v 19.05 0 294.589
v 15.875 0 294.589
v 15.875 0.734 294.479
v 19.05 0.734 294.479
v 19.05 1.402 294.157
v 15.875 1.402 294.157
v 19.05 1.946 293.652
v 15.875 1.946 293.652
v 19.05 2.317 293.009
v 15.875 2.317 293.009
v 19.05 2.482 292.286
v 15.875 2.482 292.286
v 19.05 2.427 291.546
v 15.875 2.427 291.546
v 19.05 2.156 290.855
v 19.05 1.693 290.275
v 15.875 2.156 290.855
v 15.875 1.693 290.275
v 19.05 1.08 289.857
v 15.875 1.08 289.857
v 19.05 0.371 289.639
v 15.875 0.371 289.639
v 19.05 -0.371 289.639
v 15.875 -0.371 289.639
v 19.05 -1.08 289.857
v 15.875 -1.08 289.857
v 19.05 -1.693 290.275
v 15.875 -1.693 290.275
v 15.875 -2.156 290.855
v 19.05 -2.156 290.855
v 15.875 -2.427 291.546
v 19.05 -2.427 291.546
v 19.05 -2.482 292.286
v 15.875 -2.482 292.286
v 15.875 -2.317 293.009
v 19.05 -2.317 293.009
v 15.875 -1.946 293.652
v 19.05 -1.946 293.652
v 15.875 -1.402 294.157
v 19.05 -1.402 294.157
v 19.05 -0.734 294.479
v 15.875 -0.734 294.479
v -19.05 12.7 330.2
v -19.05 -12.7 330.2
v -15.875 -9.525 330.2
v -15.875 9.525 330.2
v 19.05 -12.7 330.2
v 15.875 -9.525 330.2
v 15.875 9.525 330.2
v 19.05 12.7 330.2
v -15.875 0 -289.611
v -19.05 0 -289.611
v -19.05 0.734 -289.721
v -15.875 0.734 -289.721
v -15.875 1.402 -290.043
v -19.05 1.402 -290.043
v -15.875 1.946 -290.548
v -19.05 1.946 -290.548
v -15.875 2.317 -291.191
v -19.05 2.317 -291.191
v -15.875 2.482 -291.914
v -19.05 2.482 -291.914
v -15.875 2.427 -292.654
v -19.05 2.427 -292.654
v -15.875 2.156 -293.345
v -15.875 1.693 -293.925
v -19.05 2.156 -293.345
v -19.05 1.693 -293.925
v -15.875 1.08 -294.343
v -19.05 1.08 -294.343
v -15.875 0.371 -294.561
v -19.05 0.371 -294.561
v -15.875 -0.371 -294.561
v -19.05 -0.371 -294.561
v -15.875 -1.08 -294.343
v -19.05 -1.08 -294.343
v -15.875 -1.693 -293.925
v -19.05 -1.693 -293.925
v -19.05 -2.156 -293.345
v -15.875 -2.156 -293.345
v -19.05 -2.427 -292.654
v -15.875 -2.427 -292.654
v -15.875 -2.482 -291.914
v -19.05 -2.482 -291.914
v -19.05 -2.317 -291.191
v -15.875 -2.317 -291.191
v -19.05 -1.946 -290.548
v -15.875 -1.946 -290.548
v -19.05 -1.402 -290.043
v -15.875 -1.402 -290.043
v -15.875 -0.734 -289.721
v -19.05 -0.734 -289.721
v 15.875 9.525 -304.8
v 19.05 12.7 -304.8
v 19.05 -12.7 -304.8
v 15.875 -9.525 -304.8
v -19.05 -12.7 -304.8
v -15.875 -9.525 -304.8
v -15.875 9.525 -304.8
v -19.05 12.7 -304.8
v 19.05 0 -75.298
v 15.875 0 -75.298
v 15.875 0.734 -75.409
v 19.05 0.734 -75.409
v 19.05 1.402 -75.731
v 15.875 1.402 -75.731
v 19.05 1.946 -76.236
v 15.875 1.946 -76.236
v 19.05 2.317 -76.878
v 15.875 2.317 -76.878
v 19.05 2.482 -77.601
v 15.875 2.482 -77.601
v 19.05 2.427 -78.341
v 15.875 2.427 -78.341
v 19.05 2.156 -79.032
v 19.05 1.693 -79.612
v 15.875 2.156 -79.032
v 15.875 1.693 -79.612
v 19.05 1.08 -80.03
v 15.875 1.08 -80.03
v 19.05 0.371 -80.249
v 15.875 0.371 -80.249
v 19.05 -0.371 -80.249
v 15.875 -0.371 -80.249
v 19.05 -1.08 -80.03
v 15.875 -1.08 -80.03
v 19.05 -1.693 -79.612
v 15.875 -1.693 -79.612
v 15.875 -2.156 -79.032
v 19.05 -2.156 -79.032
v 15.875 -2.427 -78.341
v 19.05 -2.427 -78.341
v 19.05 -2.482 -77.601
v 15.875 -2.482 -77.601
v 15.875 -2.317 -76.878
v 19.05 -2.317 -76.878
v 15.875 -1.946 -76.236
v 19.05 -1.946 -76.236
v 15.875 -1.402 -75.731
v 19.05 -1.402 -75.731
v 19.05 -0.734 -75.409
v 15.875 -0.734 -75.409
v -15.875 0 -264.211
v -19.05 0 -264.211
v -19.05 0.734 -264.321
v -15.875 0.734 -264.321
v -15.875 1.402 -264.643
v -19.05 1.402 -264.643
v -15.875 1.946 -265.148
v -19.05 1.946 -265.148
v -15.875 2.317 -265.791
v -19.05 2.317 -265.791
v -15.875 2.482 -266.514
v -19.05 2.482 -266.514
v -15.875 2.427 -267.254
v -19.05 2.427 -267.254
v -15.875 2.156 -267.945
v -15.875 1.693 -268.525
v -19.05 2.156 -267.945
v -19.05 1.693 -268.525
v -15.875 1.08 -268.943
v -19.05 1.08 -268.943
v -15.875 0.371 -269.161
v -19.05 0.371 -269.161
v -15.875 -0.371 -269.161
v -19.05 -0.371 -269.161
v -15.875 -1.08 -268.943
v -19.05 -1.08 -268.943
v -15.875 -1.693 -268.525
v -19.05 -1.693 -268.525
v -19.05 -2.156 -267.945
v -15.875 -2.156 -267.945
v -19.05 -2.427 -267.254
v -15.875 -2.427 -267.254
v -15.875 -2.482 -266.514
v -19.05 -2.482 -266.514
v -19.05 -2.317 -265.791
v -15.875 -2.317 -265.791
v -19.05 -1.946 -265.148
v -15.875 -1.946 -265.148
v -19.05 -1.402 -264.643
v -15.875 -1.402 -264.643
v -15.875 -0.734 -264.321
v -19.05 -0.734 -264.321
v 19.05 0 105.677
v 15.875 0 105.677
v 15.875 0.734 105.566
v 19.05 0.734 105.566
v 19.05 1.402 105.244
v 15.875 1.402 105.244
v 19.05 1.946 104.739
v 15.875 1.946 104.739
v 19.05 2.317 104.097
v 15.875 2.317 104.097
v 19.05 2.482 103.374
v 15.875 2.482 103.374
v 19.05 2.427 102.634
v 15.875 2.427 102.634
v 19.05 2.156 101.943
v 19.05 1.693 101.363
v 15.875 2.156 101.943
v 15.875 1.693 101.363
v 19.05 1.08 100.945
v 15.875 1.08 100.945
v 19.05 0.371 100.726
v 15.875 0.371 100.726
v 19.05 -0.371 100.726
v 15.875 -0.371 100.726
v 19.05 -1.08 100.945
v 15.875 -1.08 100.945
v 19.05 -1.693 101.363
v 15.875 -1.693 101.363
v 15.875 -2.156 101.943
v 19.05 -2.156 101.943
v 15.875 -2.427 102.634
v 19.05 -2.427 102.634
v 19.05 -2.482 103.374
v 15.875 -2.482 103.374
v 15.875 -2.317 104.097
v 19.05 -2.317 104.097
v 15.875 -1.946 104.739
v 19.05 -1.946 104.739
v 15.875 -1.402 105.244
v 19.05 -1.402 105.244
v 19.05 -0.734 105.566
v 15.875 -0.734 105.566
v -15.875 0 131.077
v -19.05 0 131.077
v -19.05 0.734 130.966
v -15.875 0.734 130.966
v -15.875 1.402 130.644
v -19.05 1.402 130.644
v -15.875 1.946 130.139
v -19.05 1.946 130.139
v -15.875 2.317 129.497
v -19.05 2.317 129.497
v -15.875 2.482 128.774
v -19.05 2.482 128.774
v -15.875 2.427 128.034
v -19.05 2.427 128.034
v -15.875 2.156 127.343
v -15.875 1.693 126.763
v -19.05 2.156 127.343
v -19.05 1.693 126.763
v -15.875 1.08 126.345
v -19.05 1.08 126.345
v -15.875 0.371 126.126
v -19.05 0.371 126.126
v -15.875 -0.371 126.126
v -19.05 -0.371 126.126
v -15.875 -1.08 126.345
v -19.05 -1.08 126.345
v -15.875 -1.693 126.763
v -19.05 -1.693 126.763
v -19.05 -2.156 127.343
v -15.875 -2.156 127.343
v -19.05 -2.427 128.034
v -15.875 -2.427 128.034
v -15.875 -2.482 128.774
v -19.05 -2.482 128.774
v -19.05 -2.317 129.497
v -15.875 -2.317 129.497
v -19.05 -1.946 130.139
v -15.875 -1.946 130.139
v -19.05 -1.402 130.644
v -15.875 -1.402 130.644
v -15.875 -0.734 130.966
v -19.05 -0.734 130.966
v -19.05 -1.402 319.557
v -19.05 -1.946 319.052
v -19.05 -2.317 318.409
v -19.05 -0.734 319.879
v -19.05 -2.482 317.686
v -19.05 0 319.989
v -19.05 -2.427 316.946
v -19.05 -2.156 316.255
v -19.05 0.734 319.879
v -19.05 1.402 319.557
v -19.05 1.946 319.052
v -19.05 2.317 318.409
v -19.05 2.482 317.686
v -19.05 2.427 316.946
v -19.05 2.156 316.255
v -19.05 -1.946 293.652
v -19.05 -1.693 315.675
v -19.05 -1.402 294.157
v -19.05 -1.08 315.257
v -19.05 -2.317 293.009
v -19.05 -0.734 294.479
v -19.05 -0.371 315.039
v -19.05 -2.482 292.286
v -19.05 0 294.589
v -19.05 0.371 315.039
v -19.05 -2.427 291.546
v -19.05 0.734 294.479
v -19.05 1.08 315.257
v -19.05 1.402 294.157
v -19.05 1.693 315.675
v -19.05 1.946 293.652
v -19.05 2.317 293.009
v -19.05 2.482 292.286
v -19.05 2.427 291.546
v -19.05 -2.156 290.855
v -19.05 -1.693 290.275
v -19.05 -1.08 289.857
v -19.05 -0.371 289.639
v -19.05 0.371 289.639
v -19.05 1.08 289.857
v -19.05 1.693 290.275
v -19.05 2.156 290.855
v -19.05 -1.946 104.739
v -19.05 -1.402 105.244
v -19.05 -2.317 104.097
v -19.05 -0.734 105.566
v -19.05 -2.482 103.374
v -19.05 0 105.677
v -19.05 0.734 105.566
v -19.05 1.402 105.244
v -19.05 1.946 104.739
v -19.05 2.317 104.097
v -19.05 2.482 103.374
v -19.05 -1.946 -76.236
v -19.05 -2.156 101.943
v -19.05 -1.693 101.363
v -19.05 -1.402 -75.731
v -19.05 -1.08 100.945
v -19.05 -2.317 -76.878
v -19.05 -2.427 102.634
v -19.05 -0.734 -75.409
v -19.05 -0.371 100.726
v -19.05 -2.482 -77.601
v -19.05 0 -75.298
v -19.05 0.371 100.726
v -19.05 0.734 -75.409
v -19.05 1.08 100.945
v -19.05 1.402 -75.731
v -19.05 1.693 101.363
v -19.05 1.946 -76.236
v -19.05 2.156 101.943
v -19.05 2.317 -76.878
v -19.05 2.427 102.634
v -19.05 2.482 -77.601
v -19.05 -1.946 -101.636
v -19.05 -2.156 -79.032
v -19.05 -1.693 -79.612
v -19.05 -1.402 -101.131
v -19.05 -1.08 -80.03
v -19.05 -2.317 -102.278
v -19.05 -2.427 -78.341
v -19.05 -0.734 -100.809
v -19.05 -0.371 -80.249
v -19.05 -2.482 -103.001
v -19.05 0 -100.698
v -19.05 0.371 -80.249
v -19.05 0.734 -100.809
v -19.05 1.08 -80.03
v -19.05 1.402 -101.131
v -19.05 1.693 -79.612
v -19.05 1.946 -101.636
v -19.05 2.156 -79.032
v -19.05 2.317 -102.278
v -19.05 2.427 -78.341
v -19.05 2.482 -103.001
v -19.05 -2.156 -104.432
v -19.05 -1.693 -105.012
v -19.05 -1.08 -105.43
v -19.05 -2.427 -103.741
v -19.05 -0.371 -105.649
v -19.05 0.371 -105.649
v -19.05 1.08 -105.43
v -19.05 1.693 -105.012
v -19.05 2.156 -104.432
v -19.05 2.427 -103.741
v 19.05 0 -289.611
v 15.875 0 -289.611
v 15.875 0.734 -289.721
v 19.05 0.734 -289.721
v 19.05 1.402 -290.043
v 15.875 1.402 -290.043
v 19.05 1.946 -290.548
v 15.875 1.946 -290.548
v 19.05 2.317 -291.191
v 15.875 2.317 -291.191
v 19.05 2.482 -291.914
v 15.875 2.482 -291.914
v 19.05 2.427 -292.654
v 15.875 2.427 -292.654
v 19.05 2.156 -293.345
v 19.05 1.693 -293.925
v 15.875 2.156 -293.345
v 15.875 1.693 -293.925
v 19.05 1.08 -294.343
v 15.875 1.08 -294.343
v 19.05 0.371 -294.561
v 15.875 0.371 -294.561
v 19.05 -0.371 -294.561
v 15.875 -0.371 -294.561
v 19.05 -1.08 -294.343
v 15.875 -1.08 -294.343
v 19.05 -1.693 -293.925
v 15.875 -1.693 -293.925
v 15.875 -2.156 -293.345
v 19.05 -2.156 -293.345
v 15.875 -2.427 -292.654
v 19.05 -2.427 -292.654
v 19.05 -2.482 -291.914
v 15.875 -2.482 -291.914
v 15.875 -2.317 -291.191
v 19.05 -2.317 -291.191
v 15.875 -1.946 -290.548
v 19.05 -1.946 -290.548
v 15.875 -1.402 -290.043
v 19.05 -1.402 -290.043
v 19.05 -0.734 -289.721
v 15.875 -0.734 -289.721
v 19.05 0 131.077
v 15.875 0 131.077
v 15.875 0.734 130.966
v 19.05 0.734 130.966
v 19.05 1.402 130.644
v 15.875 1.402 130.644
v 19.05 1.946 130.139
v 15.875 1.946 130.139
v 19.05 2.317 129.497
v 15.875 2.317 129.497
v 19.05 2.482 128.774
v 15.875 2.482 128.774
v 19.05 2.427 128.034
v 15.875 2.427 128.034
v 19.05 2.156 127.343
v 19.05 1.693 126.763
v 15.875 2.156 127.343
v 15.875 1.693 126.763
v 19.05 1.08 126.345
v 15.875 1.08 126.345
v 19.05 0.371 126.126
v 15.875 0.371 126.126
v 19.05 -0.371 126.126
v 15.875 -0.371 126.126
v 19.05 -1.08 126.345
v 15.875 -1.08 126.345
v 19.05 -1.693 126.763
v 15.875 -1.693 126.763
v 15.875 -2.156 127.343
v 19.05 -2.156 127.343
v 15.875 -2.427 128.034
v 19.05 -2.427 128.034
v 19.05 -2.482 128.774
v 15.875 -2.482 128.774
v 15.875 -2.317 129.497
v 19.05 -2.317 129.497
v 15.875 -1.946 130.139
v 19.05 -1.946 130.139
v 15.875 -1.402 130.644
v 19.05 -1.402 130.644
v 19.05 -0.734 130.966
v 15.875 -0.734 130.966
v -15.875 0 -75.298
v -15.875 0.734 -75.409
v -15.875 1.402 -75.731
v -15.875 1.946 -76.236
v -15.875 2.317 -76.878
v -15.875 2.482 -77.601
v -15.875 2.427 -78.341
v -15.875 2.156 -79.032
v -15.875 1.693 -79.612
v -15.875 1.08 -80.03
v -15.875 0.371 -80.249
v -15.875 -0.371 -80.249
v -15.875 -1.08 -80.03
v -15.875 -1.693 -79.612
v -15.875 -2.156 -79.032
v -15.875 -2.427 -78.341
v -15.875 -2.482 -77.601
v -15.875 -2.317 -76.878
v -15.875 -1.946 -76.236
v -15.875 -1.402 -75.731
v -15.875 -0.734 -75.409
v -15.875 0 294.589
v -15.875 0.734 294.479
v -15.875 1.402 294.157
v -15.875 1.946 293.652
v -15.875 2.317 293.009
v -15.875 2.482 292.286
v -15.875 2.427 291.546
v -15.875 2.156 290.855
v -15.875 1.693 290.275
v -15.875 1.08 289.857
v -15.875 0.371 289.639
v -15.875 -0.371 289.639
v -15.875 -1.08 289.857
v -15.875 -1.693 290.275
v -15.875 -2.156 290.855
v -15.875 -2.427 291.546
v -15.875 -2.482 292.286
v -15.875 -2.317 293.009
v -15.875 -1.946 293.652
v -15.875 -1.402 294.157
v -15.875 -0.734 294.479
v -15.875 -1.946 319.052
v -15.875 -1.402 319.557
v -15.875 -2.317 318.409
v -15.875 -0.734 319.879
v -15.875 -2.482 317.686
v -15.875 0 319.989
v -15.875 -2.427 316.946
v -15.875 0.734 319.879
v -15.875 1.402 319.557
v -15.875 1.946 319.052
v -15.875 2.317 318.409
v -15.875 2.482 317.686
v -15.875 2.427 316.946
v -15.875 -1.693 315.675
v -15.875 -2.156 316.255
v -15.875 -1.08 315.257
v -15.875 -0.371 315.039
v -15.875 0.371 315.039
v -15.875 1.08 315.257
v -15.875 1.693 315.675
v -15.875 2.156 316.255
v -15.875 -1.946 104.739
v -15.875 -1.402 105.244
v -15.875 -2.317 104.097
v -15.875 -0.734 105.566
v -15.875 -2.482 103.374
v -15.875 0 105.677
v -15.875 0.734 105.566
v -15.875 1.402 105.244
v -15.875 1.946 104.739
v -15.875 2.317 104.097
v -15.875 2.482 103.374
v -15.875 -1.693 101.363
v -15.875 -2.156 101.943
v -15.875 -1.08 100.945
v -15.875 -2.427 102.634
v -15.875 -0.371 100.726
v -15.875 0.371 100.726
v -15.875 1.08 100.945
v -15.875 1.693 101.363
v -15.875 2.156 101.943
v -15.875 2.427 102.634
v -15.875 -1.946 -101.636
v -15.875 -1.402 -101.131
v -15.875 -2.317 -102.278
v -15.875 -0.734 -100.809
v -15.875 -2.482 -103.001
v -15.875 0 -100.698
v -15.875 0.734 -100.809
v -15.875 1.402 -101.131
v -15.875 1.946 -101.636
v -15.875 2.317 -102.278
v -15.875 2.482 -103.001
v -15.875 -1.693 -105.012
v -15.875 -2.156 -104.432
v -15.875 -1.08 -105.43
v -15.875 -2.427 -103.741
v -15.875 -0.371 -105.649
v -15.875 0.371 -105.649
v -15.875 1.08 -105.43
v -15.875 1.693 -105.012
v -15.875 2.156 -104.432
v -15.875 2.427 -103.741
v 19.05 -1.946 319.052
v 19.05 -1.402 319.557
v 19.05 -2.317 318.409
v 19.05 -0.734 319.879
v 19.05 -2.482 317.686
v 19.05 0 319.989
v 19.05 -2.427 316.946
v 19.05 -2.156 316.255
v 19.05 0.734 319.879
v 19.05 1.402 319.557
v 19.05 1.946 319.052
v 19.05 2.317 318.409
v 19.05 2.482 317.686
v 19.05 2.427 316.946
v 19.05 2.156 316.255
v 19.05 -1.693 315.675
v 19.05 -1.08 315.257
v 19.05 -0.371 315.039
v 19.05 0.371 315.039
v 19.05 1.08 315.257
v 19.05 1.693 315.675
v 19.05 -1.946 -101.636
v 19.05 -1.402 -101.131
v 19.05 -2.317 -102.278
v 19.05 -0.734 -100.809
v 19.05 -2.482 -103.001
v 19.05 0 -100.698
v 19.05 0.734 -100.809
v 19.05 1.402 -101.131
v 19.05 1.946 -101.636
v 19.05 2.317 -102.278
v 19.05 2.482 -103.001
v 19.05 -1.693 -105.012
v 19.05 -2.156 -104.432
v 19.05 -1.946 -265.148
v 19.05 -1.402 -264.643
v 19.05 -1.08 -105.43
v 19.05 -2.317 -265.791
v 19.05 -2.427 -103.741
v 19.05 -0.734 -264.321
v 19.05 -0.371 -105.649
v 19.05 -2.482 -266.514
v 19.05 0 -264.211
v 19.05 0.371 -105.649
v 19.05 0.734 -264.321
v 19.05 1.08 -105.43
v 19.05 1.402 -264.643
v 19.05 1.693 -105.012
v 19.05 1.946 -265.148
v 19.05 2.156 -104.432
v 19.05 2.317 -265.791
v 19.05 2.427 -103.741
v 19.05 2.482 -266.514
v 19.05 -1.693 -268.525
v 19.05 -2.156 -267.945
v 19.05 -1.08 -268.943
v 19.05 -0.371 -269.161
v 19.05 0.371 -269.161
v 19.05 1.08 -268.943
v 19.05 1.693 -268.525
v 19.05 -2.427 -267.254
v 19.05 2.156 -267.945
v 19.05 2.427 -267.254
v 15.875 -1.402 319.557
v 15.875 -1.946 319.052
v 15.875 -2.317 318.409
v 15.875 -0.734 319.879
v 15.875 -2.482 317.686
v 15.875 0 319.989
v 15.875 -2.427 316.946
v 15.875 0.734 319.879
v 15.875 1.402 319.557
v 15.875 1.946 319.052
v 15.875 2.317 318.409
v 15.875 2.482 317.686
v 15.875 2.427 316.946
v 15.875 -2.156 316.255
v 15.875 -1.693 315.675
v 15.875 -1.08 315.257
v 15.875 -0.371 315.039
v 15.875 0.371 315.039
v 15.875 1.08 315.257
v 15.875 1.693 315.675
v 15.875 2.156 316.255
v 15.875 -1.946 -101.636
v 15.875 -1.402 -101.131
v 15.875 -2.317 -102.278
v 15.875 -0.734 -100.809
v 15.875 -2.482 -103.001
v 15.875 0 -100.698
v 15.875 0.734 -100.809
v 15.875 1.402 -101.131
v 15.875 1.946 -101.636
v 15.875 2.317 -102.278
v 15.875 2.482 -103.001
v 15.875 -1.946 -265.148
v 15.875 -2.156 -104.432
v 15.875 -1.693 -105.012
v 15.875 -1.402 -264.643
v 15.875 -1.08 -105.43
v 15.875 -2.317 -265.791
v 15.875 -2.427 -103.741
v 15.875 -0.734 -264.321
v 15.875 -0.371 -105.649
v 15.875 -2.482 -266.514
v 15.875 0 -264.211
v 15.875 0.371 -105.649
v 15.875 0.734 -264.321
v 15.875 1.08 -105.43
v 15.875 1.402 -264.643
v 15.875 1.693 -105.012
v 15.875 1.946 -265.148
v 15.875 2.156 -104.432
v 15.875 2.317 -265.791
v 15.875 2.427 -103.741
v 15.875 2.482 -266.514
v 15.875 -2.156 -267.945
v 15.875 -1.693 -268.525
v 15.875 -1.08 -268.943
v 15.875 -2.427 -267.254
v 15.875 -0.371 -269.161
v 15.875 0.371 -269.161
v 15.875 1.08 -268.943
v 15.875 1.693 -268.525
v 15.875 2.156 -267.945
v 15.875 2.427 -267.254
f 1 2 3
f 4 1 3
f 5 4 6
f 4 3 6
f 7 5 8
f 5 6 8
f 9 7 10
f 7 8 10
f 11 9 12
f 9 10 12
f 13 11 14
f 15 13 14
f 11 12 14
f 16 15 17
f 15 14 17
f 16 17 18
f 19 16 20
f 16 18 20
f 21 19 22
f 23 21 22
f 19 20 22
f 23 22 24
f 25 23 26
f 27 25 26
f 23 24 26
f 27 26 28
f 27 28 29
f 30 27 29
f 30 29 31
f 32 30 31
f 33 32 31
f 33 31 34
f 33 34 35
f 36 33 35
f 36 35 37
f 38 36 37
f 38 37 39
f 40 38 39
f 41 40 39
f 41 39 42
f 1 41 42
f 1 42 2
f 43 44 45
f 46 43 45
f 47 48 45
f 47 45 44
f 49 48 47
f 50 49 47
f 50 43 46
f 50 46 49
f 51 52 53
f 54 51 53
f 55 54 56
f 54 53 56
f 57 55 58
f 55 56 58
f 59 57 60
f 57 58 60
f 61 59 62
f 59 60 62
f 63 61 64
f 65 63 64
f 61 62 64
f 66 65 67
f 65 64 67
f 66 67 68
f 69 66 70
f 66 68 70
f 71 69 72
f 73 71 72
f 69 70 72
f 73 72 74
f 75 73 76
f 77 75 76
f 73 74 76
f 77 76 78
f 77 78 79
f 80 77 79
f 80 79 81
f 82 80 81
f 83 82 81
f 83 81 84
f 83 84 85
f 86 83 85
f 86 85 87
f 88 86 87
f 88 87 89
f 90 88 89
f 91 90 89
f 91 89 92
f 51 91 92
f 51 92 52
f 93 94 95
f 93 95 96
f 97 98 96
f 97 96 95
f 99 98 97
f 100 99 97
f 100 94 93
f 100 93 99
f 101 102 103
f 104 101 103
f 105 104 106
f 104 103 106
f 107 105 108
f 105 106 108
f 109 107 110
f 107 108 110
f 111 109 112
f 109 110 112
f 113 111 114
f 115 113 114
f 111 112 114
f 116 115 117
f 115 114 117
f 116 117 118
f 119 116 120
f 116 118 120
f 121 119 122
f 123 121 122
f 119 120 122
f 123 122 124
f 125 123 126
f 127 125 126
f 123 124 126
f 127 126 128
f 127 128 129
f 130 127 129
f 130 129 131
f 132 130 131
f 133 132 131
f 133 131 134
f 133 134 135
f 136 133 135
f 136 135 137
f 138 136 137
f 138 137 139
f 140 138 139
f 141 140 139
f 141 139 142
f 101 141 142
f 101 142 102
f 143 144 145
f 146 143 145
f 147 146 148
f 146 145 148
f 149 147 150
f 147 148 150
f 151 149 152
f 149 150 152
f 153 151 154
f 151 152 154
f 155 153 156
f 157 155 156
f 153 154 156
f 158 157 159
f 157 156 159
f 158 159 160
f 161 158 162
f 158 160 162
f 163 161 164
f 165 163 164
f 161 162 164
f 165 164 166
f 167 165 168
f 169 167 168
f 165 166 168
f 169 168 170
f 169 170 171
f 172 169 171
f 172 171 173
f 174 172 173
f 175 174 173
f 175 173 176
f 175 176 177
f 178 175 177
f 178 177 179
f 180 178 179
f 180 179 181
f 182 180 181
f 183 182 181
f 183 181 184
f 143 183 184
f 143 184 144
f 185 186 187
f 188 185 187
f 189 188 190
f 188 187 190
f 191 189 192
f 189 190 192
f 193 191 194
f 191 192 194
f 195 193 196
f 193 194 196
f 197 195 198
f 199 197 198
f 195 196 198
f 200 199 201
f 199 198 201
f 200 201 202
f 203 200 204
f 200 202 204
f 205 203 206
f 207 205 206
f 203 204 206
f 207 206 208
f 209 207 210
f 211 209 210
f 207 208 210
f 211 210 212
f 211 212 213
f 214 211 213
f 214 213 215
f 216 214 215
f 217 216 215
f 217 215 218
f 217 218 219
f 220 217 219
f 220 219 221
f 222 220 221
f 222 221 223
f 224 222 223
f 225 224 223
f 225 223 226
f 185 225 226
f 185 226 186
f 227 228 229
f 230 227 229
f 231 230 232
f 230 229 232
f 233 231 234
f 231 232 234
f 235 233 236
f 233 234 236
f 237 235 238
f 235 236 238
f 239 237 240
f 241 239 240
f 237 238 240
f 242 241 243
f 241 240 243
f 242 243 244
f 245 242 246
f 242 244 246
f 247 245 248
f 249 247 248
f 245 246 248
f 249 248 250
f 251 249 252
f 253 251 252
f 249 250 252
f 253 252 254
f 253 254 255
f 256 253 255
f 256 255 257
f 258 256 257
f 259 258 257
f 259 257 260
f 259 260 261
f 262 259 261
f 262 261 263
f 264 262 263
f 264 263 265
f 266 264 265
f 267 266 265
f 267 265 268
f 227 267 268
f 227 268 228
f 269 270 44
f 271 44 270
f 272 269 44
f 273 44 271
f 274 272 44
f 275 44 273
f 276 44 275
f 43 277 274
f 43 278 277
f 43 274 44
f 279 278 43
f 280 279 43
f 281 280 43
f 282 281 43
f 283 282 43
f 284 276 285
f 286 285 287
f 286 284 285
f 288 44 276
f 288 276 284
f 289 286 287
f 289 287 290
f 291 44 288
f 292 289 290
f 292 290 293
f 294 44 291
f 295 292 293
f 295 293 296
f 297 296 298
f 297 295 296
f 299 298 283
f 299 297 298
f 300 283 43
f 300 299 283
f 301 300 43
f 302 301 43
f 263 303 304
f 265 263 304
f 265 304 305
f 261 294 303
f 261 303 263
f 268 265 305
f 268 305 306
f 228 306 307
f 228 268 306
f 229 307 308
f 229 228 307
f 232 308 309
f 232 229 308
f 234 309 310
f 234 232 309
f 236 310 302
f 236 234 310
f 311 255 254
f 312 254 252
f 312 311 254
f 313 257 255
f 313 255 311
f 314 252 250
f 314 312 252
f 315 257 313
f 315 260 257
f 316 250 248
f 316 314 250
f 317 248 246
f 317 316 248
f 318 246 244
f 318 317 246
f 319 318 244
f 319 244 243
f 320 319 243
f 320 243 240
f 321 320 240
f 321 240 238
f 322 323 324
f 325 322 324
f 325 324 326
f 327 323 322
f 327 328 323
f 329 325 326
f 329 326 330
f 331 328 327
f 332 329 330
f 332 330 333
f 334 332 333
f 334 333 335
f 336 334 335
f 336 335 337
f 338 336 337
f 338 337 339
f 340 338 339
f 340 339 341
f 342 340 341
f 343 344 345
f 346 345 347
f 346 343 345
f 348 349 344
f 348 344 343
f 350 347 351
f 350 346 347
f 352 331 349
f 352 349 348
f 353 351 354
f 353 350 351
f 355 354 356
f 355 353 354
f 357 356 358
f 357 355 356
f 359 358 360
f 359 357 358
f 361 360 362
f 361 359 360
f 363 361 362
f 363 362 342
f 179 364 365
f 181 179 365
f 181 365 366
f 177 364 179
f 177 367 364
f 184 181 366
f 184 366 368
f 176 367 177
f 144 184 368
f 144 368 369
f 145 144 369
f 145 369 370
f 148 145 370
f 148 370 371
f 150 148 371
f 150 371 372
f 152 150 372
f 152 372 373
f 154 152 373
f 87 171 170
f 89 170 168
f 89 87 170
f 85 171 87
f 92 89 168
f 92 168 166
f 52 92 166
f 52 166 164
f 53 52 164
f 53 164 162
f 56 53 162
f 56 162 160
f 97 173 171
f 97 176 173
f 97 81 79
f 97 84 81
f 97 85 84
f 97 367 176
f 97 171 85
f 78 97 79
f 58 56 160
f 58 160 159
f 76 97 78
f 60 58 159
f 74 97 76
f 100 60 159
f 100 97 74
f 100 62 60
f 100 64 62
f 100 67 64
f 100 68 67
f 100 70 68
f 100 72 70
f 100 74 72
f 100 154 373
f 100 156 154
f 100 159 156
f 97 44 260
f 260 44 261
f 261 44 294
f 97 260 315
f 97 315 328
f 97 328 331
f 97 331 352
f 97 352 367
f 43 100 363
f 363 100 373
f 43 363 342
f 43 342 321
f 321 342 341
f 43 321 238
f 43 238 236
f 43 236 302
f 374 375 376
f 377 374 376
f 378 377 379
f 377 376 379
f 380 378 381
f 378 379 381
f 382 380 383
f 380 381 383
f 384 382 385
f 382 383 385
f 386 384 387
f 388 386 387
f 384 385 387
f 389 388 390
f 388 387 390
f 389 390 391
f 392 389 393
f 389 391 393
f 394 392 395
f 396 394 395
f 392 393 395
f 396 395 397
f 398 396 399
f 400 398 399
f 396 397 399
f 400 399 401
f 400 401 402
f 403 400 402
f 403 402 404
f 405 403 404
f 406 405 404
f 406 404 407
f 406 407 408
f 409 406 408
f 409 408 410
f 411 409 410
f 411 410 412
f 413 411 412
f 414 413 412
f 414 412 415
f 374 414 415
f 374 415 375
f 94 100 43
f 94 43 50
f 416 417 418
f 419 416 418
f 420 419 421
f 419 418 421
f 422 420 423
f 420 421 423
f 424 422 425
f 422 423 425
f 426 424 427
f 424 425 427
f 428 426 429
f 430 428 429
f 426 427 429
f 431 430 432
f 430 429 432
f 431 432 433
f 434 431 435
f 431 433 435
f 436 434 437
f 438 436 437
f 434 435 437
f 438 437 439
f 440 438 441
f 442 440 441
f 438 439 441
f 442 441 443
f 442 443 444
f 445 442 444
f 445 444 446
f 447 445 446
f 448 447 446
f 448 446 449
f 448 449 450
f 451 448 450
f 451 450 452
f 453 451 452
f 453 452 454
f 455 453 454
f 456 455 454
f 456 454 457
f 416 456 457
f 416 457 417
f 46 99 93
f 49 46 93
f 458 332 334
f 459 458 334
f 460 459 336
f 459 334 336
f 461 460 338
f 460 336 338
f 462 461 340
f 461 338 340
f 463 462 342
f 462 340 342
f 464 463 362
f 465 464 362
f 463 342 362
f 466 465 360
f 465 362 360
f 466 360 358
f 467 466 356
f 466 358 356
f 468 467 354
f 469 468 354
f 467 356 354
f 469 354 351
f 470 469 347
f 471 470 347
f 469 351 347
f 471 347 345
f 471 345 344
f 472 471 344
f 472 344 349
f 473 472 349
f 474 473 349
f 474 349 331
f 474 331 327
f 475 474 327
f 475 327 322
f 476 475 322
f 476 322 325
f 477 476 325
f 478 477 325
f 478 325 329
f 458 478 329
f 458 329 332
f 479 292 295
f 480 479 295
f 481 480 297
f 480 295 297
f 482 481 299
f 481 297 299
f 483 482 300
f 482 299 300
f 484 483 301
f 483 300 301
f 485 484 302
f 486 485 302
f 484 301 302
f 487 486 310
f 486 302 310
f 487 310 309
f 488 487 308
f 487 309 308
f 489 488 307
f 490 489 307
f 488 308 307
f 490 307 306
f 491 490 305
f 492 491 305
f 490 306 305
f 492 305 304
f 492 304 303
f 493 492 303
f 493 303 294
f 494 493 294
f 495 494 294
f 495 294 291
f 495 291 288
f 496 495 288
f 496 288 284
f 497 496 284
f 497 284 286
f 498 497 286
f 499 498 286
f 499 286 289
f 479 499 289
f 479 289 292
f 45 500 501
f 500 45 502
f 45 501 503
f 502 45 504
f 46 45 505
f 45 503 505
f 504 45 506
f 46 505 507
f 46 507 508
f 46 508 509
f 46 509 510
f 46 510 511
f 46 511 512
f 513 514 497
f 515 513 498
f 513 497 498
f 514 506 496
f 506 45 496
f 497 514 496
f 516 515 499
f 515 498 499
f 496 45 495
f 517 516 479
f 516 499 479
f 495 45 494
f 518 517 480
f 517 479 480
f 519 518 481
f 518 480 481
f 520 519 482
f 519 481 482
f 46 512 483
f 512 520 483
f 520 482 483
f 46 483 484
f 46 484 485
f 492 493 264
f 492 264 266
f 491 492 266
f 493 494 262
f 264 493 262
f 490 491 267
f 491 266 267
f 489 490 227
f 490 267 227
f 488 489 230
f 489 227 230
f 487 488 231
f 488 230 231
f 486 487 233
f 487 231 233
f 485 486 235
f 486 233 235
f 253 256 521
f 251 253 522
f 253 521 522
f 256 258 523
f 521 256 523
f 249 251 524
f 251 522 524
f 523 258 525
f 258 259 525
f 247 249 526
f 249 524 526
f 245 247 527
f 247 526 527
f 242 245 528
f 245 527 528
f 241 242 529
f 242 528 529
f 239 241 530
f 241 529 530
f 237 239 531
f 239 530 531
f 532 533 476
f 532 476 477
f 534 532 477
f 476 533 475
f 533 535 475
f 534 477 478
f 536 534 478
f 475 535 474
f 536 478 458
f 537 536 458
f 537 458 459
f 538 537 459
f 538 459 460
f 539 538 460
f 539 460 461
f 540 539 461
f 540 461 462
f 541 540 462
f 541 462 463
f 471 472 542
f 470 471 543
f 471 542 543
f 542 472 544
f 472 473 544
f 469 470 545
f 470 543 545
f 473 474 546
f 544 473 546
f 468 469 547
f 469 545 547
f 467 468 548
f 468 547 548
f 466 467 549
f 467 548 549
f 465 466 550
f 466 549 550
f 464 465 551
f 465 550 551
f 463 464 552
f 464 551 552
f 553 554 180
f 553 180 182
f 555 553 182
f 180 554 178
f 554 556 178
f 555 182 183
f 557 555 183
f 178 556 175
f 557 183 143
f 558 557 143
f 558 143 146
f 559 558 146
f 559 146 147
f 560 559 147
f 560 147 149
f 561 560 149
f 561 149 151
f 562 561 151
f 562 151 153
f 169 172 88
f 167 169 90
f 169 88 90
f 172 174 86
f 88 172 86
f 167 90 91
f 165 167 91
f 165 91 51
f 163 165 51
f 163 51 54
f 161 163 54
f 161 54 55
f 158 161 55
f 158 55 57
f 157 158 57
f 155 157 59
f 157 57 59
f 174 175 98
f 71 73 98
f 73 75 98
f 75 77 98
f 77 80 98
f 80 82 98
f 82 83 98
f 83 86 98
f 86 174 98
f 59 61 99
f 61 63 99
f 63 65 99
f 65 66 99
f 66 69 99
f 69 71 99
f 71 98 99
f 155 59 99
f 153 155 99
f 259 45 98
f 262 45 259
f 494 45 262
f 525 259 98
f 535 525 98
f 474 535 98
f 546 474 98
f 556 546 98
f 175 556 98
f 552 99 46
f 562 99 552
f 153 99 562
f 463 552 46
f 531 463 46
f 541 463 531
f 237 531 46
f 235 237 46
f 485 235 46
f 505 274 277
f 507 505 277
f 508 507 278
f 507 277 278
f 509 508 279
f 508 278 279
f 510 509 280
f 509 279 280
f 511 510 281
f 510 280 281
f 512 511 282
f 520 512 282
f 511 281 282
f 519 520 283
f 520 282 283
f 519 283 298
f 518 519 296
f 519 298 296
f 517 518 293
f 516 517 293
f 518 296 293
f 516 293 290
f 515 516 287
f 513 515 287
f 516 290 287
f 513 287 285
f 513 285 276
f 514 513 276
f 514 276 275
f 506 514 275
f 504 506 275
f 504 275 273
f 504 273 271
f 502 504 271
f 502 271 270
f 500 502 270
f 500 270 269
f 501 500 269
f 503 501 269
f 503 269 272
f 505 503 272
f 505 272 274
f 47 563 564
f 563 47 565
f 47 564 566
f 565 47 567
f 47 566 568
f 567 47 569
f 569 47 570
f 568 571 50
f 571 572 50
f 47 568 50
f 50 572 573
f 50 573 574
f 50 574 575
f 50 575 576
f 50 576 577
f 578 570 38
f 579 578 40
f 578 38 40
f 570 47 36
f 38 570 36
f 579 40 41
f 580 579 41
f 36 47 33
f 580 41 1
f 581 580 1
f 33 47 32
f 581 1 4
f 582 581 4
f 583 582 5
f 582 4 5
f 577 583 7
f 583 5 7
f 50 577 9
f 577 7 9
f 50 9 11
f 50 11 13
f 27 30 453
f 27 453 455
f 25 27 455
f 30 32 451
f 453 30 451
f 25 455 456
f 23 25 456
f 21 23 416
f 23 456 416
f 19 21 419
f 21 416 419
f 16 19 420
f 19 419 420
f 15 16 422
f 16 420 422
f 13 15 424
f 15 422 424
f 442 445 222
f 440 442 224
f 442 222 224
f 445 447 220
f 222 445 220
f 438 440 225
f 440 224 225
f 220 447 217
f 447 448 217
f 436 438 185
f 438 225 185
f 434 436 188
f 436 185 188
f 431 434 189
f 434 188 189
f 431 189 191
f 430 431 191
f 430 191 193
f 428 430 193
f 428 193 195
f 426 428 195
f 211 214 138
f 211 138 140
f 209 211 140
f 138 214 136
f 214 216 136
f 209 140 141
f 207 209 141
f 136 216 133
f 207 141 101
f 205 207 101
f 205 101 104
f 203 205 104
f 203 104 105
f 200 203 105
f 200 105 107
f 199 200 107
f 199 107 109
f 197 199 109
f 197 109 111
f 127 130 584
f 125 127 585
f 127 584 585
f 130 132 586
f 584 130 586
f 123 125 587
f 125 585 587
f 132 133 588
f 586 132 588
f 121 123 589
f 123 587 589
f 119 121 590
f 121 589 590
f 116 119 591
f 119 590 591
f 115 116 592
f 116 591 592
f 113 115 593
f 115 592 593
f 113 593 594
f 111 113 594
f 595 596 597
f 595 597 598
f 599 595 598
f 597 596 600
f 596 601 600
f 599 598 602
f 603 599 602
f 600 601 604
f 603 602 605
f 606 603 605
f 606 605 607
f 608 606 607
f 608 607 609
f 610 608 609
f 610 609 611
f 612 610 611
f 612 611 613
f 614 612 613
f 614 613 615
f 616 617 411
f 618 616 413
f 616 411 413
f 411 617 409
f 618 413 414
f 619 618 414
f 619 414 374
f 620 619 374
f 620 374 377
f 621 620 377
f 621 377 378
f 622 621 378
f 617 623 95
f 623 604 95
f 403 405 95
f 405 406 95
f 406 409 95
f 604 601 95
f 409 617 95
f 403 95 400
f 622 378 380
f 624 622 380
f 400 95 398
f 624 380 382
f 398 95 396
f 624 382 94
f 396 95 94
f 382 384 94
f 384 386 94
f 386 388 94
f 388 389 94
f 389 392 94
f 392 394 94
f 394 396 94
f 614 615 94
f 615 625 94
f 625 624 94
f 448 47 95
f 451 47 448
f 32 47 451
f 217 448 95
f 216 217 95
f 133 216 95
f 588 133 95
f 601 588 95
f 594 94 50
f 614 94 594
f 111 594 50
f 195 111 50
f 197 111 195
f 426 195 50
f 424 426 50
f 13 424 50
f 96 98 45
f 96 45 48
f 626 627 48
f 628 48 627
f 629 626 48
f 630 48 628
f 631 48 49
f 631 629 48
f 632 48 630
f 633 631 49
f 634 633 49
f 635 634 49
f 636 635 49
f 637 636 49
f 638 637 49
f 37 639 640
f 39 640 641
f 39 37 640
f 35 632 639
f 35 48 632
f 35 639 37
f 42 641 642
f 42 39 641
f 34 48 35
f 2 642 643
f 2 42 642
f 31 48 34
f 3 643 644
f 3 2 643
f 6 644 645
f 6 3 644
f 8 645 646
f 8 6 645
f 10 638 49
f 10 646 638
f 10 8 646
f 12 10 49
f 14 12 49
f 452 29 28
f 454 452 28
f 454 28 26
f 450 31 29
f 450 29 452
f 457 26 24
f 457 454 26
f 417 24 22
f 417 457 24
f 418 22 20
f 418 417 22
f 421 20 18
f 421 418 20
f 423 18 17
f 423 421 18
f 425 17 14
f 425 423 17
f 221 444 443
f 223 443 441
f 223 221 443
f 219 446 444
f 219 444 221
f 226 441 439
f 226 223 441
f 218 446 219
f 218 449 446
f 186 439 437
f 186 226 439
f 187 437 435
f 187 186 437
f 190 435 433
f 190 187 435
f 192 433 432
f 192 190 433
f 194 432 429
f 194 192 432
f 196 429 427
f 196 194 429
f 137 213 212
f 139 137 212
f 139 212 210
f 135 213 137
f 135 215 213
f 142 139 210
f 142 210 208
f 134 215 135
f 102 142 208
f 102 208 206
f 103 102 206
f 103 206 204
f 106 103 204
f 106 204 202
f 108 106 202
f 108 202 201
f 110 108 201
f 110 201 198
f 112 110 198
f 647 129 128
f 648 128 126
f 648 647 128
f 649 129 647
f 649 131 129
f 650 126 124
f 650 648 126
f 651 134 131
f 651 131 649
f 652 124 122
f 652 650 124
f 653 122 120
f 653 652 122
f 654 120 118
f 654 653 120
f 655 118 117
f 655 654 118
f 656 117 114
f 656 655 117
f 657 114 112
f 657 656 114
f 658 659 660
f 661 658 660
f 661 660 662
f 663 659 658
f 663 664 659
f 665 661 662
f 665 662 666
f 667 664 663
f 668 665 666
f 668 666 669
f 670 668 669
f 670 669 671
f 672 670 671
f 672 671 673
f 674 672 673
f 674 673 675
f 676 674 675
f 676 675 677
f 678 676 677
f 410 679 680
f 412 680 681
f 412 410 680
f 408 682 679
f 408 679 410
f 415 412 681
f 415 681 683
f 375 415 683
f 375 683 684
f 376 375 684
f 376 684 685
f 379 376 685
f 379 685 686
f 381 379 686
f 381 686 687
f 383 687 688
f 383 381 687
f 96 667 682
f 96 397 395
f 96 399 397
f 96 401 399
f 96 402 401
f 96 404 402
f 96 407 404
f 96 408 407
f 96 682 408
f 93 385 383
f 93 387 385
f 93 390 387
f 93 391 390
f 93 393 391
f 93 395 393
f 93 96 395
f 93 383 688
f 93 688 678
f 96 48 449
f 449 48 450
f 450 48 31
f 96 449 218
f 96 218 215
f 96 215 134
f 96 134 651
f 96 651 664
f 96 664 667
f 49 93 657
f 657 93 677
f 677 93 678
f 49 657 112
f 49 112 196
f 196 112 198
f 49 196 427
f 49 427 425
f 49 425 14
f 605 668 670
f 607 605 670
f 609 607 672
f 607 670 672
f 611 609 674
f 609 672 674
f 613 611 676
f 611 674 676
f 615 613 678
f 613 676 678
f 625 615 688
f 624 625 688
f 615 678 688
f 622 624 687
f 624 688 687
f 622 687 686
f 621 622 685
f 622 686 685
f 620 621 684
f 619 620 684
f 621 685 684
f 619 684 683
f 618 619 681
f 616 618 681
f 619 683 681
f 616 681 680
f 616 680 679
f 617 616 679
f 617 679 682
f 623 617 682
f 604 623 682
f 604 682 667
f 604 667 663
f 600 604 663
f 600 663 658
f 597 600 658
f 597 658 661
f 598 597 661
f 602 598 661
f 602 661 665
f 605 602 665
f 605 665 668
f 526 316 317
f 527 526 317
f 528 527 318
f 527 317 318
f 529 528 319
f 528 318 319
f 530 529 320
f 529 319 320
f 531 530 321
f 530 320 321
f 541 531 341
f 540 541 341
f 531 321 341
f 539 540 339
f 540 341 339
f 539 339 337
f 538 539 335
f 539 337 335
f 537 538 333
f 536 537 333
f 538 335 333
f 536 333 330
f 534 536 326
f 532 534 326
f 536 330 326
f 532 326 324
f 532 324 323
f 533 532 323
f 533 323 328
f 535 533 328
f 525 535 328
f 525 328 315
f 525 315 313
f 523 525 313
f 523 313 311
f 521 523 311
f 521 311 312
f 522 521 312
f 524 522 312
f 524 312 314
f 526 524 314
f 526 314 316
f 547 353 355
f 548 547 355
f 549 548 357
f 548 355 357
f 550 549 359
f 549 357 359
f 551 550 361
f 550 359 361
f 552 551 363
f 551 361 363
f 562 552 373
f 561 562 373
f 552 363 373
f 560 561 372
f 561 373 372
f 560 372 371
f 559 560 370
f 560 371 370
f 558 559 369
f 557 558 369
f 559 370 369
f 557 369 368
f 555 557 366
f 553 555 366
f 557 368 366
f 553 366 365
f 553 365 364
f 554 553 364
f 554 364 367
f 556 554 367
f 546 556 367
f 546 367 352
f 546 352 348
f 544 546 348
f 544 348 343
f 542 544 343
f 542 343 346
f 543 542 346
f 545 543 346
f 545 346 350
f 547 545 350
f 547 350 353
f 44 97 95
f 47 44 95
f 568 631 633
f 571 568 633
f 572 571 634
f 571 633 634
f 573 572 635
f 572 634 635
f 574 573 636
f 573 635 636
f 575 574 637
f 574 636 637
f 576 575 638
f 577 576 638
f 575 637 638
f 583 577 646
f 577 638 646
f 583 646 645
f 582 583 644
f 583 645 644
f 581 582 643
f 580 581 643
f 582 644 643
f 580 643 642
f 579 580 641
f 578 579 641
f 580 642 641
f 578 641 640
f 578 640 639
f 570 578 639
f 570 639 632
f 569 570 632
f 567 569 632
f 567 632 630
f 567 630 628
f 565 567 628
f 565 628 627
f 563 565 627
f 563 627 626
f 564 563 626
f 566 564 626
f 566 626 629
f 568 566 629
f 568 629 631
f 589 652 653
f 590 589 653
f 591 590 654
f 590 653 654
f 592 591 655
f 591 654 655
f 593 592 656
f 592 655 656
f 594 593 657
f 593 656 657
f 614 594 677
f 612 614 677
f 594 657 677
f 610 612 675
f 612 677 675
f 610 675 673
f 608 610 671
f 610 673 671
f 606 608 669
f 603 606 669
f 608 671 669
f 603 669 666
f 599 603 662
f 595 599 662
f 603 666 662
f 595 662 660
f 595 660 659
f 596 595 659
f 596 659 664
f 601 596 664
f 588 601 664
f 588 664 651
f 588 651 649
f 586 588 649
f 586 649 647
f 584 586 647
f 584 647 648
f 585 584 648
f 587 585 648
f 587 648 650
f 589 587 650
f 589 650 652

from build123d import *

# Parameters (mm, degrees)
BOSS_EXTRUDE1_DEPTH      = 330.200001
BOSS_EXTRUDE1_DEPTH_BACK = 330.200001
SKETCH3_W                = 38.1
SKETCH3_H                = 25.4
SKETCH3_W_2              = 31.75
SKETCH3_H_2              = 19.05
F_10_CLEARANCE_HOLE1_D   = 4.9784


with BuildPart() as part:
    # Sketch3 → Boss-Extrude1 (new, two sides: drawn at the far end of the back side and taken through both)
    with BuildSketch(Plane.XY.offset(-BOSS_EXTRUDE1_DEPTH_BACK)):
        Rectangle(SKETCH3_W, SKETCH3_H)
        Rectangle(SKETCH3_W_2, SKETCH3_H_2, mode=Mode.SUBTRACT)
    extrude(amount=BOSS_EXTRUDE1_DEPTH + BOSS_EXTRUDE1_DEPTH_BACK)

    # SurfaceCut1
    split(bisect_by=Plane(origin=(0, 0, -304.800000508), x_dir=(-1, 0, 0), z_dir=(0, 0, -1)), keep=Keep.BOTTOM)

    # #10 Clearance Hole1 (through all)
    with Locations(Plane(origin=(19.05, 0, 0), x_dir=(0, 0, -1), z_dir=(1, 0, 0))):
        with Locations((-128.5875, 0), (-103.1875, 0), (77.787500575, 1.014e-06), (103.187500575, 1.014e-06), (-317.500000508, 0), (-292.100000508, 0), (266.700000508, 0), (292.100000508, 0)):
            Hole(F_10_CLEARANCE_HOLE1_D / 2)


solid = part.part
